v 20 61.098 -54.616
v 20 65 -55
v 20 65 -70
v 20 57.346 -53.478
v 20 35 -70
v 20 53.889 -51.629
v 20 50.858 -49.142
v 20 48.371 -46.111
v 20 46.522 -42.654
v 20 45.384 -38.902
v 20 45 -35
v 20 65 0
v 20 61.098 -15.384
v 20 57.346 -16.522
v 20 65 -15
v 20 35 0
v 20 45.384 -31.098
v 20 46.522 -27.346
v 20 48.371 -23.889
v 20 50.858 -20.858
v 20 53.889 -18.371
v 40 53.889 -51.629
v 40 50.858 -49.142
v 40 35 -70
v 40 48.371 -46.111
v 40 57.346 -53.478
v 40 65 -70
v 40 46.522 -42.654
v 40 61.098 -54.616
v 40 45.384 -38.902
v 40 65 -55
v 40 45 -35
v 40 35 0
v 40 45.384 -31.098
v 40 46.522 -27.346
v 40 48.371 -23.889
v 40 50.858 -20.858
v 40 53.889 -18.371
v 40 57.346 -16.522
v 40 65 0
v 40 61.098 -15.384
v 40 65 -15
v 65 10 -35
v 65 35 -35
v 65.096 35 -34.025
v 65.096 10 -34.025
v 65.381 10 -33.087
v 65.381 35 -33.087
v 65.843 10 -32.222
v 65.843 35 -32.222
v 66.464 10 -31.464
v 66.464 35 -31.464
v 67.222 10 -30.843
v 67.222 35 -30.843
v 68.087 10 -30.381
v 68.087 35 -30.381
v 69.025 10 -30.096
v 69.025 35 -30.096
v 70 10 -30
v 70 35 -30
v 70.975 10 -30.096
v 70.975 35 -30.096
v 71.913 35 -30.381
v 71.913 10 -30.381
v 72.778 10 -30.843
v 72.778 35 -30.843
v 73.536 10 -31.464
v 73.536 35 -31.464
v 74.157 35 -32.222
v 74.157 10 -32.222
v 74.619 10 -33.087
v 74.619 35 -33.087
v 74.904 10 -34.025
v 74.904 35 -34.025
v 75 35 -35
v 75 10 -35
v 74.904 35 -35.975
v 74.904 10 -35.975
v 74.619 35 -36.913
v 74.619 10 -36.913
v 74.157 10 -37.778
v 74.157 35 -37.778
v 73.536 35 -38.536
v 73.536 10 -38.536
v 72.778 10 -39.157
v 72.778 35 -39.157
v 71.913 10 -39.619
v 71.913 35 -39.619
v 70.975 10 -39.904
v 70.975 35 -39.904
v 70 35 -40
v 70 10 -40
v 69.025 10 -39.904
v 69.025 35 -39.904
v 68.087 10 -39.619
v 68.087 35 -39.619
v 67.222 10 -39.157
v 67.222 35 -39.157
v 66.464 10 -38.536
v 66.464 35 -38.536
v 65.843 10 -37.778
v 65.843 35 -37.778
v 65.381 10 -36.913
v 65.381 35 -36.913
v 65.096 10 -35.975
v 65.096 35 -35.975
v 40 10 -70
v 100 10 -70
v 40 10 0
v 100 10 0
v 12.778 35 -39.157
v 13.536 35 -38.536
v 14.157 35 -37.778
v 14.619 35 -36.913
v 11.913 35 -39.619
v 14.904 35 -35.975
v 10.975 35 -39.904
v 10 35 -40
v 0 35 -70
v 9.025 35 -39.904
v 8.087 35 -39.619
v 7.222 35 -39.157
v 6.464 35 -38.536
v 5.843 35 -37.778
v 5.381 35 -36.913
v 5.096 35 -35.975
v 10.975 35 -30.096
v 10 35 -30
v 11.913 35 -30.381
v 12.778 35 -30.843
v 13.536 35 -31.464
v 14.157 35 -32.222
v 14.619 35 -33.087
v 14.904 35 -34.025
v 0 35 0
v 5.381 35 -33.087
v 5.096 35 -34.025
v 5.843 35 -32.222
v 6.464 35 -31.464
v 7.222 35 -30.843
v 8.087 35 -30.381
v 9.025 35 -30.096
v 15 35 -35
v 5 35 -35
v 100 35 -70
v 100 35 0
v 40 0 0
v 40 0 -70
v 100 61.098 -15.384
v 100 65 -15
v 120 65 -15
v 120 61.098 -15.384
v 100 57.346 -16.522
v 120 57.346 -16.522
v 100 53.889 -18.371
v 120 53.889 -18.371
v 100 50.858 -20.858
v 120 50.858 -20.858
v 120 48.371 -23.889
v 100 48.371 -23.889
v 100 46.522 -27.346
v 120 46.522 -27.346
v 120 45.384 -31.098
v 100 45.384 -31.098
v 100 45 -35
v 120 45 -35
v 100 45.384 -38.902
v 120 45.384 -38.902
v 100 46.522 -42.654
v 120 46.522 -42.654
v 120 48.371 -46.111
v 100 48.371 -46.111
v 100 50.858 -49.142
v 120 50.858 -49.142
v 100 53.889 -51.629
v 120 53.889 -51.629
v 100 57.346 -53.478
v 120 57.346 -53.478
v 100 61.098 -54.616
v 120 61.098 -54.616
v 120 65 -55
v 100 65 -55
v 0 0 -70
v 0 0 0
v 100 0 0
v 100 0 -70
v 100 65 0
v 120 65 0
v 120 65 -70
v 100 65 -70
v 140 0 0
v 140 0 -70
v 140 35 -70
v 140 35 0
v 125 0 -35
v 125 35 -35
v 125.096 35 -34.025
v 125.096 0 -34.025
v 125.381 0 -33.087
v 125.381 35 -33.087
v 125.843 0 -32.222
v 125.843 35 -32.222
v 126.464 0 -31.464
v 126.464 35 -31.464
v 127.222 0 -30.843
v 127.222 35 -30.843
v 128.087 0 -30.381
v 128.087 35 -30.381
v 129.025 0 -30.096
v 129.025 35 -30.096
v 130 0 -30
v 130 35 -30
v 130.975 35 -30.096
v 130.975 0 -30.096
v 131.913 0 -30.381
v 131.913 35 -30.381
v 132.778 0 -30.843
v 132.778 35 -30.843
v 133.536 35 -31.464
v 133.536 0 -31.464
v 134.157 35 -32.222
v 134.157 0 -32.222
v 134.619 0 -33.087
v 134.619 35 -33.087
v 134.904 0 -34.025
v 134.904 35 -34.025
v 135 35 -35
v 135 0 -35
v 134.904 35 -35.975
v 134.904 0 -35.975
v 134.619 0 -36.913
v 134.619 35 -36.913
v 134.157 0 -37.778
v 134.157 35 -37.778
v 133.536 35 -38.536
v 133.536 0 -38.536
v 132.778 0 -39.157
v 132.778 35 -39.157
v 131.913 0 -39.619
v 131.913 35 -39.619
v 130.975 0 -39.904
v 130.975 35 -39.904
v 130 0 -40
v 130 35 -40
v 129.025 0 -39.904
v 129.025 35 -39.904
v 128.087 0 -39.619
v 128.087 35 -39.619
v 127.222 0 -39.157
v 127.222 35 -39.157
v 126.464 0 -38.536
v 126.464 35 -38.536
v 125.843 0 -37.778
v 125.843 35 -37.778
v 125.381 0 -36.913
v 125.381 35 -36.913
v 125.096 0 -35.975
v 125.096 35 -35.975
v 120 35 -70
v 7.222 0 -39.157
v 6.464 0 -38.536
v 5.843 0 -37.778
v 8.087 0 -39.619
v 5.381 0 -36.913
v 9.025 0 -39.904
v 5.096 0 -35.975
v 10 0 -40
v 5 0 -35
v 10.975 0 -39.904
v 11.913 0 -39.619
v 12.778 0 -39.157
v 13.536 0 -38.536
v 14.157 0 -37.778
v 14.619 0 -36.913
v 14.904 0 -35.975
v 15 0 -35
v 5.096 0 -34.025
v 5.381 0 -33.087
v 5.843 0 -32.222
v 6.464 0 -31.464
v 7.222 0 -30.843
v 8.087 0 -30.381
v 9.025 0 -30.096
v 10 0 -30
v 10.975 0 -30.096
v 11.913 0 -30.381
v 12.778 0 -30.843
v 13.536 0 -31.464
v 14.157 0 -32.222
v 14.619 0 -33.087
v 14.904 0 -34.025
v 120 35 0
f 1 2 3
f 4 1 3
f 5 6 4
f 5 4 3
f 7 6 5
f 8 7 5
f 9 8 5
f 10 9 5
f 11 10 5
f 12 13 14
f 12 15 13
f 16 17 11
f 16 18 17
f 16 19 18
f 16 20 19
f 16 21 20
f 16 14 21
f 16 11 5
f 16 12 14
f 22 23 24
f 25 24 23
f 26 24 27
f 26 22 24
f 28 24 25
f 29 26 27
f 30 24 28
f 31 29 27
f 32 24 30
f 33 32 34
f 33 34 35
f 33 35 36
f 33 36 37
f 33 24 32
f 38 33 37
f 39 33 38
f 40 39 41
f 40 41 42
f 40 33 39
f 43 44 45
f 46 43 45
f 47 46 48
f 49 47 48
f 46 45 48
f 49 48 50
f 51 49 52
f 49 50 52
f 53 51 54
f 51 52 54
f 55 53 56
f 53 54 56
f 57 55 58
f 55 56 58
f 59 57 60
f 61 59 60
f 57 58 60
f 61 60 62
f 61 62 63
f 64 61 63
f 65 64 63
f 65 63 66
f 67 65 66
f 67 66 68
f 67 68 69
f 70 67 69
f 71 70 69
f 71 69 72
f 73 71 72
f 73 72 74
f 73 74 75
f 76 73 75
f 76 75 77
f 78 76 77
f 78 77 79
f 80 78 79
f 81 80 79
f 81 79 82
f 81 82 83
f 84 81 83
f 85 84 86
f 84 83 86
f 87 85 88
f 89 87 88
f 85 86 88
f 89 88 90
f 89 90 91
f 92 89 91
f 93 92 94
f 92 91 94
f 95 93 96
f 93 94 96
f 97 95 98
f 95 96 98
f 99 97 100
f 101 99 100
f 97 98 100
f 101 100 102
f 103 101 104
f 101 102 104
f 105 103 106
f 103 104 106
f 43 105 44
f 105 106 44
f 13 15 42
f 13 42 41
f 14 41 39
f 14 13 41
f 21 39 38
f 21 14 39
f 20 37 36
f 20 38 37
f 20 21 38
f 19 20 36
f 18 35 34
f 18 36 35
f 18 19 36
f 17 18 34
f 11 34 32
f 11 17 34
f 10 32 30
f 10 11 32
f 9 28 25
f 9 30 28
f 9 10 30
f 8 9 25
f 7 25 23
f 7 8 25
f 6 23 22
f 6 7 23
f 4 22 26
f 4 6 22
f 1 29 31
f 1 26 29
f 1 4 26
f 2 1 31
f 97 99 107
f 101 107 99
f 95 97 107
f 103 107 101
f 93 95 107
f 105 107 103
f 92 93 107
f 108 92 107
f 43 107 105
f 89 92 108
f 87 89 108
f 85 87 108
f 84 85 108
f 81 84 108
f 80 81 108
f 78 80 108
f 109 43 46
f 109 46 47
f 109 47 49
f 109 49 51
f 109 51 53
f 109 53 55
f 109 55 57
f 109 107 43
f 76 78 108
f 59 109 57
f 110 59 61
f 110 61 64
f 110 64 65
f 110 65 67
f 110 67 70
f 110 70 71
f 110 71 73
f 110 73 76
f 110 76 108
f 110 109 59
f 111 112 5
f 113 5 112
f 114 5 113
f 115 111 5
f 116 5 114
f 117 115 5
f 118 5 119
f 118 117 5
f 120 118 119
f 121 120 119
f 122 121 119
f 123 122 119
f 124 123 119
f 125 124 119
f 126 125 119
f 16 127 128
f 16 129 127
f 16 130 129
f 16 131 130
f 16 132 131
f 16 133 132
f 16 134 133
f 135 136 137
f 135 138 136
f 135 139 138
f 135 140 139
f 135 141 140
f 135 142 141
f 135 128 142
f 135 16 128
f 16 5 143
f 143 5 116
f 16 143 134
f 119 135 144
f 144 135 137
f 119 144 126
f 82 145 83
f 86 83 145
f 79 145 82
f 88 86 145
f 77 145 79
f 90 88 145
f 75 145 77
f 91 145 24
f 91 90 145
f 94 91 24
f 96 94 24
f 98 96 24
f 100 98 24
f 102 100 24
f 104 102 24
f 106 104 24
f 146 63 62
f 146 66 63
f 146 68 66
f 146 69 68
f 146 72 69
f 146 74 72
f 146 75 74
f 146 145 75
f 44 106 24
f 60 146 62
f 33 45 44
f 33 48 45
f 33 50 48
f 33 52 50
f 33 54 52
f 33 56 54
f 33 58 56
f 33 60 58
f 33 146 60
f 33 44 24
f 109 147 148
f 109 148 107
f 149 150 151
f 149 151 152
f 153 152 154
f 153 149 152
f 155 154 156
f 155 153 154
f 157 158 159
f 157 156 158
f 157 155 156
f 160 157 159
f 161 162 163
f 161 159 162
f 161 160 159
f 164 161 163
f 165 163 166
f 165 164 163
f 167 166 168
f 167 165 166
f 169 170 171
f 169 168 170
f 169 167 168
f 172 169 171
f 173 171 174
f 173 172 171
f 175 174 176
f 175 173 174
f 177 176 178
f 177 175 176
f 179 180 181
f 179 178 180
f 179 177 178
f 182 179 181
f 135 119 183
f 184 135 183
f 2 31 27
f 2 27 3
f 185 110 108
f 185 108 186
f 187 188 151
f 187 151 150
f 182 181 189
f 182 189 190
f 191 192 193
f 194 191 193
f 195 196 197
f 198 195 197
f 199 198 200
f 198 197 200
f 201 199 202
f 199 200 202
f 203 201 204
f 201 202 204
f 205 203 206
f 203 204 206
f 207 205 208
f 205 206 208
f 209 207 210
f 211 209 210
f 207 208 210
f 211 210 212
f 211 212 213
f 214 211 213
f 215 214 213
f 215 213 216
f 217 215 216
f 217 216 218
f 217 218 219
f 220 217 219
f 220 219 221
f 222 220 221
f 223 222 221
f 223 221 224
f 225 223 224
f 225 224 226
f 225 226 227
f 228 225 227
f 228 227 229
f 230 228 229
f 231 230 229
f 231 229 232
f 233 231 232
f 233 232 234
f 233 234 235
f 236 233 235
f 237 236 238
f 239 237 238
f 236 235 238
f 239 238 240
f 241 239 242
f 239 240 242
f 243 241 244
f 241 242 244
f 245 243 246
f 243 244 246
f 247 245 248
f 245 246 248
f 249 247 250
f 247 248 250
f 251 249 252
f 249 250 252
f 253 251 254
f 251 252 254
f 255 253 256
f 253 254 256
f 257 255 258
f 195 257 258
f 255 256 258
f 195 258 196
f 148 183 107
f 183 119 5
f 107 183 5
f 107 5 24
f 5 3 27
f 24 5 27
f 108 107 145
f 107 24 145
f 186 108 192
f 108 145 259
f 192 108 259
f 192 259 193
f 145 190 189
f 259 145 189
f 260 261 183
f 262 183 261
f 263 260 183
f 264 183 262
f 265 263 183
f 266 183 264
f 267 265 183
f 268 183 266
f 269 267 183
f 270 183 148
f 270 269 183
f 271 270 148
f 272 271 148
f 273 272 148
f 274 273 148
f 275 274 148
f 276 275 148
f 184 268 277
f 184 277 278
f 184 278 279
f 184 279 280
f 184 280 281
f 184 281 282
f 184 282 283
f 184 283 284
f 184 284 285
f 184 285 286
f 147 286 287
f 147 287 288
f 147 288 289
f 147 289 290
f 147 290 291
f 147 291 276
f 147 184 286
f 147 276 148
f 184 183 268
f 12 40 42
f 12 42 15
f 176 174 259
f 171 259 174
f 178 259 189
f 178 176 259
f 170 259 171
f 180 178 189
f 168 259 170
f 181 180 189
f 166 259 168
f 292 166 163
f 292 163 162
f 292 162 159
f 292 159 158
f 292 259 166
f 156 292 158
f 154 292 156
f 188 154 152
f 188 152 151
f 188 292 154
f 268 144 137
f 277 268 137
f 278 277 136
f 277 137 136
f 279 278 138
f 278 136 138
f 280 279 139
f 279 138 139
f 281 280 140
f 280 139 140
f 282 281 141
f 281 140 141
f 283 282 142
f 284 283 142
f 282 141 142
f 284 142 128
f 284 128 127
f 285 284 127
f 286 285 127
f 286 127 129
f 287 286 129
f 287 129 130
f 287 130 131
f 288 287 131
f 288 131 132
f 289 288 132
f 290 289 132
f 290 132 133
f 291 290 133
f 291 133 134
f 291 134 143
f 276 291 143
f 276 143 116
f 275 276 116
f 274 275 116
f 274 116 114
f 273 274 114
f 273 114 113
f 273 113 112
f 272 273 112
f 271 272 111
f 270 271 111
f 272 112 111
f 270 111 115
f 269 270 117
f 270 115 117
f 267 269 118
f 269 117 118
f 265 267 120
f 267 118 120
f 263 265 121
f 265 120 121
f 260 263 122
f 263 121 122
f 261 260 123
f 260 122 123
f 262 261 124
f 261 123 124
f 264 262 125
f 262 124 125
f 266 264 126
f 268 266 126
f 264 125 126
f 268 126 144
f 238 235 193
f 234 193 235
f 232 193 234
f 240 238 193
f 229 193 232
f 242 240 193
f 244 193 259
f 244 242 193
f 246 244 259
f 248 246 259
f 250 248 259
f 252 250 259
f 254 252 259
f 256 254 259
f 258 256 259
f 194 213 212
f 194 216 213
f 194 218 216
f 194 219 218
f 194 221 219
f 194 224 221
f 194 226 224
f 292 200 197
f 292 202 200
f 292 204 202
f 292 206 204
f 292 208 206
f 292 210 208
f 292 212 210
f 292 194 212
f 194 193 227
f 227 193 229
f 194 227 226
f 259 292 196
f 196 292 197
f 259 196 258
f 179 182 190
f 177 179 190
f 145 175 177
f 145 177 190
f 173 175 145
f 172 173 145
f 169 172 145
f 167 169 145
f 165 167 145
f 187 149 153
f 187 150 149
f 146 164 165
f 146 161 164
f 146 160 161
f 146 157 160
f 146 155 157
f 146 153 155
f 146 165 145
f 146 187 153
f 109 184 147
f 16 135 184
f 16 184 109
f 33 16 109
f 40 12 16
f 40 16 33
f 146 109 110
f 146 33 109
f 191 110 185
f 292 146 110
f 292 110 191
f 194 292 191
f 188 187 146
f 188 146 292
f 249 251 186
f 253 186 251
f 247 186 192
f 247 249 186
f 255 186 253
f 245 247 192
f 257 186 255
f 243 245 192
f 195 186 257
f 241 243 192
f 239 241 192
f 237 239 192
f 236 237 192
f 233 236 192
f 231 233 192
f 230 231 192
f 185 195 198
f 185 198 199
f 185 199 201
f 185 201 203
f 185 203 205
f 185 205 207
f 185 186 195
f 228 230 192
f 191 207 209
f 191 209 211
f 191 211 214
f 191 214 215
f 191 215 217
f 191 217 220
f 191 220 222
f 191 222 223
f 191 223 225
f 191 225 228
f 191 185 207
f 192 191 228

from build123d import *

# Parameters (mm, degrees)
BOSS_EXTRUDE1_DEPTH     = 70
CUT_EXTRUDE1_DEPTH      = 154.378616502
CUT_EXTRUDE1_DEPTH_BACK = 154.378616502
SKETCH4_R               = 5
CUT_EXTRUDE3_DEPTH      = 161.390149323


with BuildPart() as part:
    # Sketch2 → Boss-Extrude1 (new body)
    with BuildSketch(Plane.XY):
        Polygon((0, 0), (40, 0), (40, 10), (100, 10), (100, 0), (140, 0), (140, 35), (120, 35), (120, 65), (100, 65), (100, 35), (40, 35), (40, 65), (20, 65), (20, 35), (0, 35), align=None)
    extrude(amount=-BOSS_EXTRUDE1_DEPTH)

    # Sketch3 → Cut-Extrude1 (cut, two sides: drawn at the far end of the back side and taken through both)
    with BuildSketch(Plane(origin=(120, 0, 0), x_dir=(0, 0, -1), z_dir=(1, 0, 0)).offset(-CUT_EXTRUDE1_DEPTH_BACK)):
        with BuildLine():
            Line((15, 245.293863659), (15, 65))
            ThreePointArc((15, 65), (35, 45), (55, 65))
            Line((55, 65), (55, 245.293863659))
            Line((55, 245.293863659), (55, 605.881590978))
            Line((55, 605.881590978), (15, 605.881590978))
            Line((15, 605.881590978), (15, 245.293863659))
        make_face()
    extrude(amount=CUT_EXTRUDE1_DEPTH + CUT_EXTRUDE1_DEPTH_BACK, mode=Mode.SUBTRACT)

    # Sketch4 → Cut-Extrude3 (cut, through all)
    with BuildSketch(Plane(origin=(0, 35, 0), x_dir=(1, 0, 0), z_dir=(0, 1, 0))):
        with Locations(Location((130, 35, 0), (0, 0, 180))):
            Circle(SKETCH4_R)
        with Locations(Location((10, 35, 0), (0, 0, 180))):
            Circle(SKETCH4_R)
        with Locations(Location((70, 35, 0), (0, 0, 180))):
            Circle(SKETCH4_R)
    extrude(amount=-CUT_EXTRUDE3_DEPTH, mode=Mode.SUBTRACT)


solid = part.part
